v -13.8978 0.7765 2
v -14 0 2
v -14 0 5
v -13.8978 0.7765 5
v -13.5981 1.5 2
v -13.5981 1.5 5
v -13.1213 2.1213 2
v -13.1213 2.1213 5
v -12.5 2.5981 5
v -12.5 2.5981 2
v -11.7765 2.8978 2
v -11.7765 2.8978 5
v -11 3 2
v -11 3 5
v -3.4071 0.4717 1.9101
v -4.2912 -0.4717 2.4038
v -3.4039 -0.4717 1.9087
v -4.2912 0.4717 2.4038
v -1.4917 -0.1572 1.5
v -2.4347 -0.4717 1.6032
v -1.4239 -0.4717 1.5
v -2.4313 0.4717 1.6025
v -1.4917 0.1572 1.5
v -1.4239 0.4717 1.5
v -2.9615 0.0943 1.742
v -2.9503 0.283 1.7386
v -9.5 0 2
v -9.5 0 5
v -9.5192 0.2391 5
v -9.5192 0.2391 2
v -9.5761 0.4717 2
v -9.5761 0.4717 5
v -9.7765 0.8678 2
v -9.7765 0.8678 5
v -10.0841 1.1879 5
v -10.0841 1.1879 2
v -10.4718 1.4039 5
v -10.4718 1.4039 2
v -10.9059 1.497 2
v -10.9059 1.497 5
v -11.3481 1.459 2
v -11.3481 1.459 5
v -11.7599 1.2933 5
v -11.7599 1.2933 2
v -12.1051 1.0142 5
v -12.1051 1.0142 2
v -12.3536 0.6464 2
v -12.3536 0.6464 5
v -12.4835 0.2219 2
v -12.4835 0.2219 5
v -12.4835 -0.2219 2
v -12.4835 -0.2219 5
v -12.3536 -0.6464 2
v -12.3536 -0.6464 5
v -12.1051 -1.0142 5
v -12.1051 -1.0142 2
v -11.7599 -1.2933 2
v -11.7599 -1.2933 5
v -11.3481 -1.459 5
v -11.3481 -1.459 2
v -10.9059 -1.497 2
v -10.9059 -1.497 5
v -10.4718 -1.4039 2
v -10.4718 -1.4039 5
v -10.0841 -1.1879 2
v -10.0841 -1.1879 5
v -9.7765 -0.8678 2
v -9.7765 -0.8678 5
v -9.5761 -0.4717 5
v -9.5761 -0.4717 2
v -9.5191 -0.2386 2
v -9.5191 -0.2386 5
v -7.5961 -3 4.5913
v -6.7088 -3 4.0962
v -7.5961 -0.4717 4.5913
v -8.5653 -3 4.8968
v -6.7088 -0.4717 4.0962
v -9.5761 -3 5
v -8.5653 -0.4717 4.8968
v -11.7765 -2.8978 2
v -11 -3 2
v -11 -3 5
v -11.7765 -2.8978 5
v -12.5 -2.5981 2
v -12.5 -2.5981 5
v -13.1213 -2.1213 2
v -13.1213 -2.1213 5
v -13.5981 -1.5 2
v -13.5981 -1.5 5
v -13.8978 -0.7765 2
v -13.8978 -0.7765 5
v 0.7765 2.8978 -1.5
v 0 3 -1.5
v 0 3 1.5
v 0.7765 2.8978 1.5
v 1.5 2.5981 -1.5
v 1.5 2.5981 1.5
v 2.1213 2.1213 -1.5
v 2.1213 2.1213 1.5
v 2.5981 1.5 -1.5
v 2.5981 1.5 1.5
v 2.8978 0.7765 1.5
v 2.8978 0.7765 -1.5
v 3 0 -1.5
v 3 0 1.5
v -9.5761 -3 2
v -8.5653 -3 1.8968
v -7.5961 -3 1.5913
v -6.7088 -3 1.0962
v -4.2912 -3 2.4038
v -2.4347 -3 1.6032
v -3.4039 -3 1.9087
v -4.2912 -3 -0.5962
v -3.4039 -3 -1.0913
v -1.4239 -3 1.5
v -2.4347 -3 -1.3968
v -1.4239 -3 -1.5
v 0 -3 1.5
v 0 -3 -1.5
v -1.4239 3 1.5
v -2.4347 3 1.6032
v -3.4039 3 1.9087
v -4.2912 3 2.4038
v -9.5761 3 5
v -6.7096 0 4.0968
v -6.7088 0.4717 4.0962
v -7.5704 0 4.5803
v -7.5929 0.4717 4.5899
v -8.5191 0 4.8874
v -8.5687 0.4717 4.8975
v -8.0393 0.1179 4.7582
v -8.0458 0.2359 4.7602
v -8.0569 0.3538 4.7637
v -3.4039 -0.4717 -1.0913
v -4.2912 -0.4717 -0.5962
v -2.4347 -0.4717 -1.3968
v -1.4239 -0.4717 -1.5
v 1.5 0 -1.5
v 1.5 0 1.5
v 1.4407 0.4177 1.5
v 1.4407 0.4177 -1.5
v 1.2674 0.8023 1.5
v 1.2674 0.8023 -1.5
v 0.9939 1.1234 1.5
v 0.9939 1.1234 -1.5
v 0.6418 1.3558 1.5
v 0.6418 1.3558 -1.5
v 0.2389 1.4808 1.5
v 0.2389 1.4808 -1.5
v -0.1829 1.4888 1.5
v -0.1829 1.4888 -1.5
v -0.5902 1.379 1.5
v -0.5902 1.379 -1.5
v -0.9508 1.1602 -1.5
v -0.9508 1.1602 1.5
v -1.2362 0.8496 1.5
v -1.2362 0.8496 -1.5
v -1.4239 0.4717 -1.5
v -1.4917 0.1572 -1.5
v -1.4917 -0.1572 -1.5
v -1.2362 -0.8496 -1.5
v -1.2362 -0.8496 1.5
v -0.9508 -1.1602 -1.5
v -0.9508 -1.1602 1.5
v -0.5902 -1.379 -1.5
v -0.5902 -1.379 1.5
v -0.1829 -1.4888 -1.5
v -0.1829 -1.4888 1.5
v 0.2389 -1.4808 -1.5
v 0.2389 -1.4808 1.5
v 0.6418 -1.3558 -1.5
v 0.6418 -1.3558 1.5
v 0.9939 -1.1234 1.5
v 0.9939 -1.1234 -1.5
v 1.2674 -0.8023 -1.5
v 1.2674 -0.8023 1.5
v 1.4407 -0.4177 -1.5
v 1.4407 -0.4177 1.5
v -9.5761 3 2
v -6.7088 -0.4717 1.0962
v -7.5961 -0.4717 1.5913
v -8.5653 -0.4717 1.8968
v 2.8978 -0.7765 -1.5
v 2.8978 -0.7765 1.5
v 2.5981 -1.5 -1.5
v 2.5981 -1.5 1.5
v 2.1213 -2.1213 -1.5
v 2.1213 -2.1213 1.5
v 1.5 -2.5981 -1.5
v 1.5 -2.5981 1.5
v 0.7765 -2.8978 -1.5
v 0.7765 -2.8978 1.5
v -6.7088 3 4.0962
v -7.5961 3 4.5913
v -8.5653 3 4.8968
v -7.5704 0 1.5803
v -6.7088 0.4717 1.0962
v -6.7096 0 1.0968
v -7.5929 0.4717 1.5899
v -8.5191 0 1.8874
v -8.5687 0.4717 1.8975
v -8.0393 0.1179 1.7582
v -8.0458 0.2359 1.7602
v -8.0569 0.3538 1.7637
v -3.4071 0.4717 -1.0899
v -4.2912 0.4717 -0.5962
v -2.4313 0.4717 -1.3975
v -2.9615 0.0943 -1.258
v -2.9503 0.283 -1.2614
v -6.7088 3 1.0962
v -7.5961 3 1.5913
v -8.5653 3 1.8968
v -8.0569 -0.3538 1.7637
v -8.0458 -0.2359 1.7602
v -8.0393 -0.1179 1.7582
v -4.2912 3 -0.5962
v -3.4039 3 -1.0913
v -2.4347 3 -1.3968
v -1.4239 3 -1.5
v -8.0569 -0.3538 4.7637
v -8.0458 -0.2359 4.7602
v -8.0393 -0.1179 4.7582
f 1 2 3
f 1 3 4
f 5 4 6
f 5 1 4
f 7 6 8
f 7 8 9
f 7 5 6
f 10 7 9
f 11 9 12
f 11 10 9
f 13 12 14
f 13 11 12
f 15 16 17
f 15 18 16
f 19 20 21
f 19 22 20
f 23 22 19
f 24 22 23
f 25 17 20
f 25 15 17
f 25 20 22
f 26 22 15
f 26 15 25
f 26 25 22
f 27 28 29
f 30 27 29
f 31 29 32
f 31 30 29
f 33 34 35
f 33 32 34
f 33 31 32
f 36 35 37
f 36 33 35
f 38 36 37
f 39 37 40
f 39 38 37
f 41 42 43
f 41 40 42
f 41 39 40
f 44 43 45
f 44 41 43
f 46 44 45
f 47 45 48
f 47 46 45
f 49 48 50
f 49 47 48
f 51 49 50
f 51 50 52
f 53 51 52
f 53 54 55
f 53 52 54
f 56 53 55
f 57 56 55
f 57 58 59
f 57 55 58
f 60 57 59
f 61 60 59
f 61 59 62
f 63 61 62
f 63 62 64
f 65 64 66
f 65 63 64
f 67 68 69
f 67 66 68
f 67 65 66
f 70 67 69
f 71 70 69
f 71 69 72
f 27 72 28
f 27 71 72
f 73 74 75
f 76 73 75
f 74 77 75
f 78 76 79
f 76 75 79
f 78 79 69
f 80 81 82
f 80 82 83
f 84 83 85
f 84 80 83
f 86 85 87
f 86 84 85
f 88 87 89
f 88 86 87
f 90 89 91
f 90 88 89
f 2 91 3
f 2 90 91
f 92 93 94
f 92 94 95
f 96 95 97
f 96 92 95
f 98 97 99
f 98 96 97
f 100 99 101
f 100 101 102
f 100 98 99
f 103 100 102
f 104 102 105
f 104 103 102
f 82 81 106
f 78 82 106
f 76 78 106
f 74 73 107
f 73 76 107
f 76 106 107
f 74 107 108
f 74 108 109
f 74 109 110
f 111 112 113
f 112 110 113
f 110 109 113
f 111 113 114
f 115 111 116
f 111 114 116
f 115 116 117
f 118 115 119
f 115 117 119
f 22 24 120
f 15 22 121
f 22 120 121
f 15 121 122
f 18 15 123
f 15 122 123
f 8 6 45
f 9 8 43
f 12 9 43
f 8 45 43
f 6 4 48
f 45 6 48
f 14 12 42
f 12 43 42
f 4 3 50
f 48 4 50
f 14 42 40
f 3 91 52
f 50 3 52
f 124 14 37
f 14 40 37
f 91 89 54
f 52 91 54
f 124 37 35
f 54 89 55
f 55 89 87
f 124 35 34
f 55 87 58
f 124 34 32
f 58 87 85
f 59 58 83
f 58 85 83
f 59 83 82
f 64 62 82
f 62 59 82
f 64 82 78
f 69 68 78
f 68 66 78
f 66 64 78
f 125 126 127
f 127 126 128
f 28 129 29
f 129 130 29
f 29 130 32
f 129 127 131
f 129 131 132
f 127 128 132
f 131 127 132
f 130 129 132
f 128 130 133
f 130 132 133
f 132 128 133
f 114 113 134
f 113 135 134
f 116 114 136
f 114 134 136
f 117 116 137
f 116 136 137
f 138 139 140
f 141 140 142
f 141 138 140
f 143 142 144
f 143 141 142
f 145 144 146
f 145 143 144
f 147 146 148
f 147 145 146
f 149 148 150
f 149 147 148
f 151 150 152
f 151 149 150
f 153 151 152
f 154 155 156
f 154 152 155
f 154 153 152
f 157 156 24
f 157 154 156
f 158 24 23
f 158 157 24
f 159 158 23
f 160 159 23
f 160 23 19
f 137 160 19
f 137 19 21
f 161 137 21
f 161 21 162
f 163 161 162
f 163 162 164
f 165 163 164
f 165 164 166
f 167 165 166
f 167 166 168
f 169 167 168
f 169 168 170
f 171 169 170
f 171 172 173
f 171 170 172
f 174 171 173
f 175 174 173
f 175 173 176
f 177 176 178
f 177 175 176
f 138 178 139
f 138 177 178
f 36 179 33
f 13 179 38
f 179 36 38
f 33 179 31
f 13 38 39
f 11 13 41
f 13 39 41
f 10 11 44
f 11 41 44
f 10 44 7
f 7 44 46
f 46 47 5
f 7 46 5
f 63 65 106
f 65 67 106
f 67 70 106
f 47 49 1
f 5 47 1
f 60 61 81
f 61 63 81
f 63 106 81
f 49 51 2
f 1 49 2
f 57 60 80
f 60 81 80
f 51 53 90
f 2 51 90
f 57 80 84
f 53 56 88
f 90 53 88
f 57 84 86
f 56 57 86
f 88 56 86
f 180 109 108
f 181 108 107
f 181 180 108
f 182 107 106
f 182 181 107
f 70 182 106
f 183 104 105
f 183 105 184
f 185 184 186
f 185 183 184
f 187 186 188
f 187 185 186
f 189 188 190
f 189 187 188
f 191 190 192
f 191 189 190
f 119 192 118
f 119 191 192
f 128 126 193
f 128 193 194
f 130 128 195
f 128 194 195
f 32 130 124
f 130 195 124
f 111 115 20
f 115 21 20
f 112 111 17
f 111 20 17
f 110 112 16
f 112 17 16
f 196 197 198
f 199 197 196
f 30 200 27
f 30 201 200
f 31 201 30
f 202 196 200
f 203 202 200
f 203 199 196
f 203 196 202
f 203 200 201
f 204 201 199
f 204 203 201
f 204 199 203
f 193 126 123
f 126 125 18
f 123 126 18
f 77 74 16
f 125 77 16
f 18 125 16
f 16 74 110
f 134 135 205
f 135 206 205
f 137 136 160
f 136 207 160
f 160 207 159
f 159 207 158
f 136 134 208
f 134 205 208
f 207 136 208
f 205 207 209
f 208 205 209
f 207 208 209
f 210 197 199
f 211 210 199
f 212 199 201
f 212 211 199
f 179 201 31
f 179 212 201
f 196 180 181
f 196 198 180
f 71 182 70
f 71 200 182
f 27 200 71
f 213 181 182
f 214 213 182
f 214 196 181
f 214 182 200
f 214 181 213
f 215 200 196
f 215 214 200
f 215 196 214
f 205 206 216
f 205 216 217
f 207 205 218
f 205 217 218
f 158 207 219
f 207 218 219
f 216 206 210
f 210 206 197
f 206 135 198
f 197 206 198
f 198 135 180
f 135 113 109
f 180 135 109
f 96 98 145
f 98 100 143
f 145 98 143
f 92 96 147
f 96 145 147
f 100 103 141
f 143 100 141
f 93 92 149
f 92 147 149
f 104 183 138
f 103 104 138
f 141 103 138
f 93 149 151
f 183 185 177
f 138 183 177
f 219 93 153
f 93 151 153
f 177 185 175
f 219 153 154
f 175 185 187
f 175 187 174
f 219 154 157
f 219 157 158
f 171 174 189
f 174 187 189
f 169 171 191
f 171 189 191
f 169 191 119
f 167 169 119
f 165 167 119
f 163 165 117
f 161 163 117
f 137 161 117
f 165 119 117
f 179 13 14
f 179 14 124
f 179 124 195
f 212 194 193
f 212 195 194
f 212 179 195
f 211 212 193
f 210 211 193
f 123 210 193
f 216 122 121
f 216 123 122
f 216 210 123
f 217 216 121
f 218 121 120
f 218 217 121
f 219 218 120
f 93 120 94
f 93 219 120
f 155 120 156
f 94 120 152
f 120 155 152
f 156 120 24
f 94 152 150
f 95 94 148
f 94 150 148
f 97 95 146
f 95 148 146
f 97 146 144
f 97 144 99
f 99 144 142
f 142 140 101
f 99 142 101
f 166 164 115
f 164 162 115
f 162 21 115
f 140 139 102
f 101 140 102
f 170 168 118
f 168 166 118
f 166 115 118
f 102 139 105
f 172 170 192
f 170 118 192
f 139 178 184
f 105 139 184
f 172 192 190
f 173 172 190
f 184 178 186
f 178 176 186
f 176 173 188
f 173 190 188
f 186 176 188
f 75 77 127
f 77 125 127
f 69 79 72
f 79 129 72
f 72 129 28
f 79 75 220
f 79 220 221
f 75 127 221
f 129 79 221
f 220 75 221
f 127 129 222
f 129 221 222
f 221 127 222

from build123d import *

# Parameters (mm, degrees)
BOSS_EXTRUDE1_DEPTH      = 3
BOSS_EXTRUDE1_DEPTH_BACK = 3
CUT_EXTRUDE1_DEPTH       = 3
CUT_EXTRUDE1_DEPTH_BACK  = 3
SKETCH2_R                = 1.5
CUT_EXTRUDE3_DEPTH       = 3
CUT_EXTRUDE3_DEPTH_BACK  = 3
SKETCH4_R                = 1.5
FILLET1_R                = 5


with BuildPart() as part:
    # Sketch3 → Boss-Extrude1 (new, two sides: drawn at the far end of the back side and taken through both)
    with BuildSketch(Plane(origin=(0, 0, 0), x_dir=(1, 0, 0), z_dir=(0, 1, 0)).offset(-BOSS_EXTRUDE1_DEPTH_BACK)):
        Polygon((-3, 1.5), (-8, -2), (-14, -2), (-14, -5), (-8, -5), (-3, -1.5), (3, -1.5), (3, 1.5), align=None)
    extrude(amount=BOSS_EXTRUDE1_DEPTH + BOSS_EXTRUDE1_DEPTH_BACK)

    # Sketch2 → Cut-Extrude1 (cut, two sides: drawn at the far end of the back side and taken through both)
    with BuildSketch(Plane.XY.offset(-CUT_EXTRUDE1_DEPTH_BACK)):
        with BuildLine():
            ThreePointArc((0, 3), (2.121320344, 2.121320344), (3, 0))
            Line((3, 0), (3, 3))
            Line((3, 3), (0, 3))
        make_face()
        with BuildLine():
            ThreePointArc((3, 0), (2.121320338, -2.121320349), (-1.5e-08, -3))
            Line((-1.5e-08, -3), (3, -3))
            Line((3, -3), (3, 0))
        make_face()
        Circle(SKETCH2_R)
    extrude(amount=CUT_EXTRUDE1_DEPTH + CUT_EXTRUDE1_DEPTH_BACK, mode=Mode.SUBTRACT)

    # Sketch4 → Cut-Extrude3 (cut, two sides: drawn at the far end of the back side and taken through both)
    with BuildSketch(Plane.XY.offset(5).offset(-CUT_EXTRUDE3_DEPTH_BACK)):
        with BuildLine():
            ThreePointArc((-11, -3), (-13.121320344, -2.121320344), (-14, 0))
            Line((-14, 0), (-14, -3))
            Line((-14, -3), (-11, -3))
        make_face()
        with BuildLine():
            ThreePointArc((-14, 0), (-13.121320344, 2.121320344), (-11, 3))
            Line((-11, 3), (-14, 3))
            Line((-14, 3), (-14, 0))
        make_face()
        with Locations((-11, 0)):
            Circle(SKETCH4_R)
    extrude(amount=CUT_EXTRUDE3_DEPTH + CUT_EXTRUDE3_DEPTH_BACK, mode=Mode.SUBTRACT)

    # Fillet1
    fillet1_edges = [part.edges().sort_by_distance(p)[0] for p in [
        (-8, 0, 5),
        (-8, 0, 2),
        (-3, 0, -1.5),
        (-3, 0, 1.5),
    ]]
    fillet(fillet1_edges, radius=FILLET1_R)


solid = part.part
